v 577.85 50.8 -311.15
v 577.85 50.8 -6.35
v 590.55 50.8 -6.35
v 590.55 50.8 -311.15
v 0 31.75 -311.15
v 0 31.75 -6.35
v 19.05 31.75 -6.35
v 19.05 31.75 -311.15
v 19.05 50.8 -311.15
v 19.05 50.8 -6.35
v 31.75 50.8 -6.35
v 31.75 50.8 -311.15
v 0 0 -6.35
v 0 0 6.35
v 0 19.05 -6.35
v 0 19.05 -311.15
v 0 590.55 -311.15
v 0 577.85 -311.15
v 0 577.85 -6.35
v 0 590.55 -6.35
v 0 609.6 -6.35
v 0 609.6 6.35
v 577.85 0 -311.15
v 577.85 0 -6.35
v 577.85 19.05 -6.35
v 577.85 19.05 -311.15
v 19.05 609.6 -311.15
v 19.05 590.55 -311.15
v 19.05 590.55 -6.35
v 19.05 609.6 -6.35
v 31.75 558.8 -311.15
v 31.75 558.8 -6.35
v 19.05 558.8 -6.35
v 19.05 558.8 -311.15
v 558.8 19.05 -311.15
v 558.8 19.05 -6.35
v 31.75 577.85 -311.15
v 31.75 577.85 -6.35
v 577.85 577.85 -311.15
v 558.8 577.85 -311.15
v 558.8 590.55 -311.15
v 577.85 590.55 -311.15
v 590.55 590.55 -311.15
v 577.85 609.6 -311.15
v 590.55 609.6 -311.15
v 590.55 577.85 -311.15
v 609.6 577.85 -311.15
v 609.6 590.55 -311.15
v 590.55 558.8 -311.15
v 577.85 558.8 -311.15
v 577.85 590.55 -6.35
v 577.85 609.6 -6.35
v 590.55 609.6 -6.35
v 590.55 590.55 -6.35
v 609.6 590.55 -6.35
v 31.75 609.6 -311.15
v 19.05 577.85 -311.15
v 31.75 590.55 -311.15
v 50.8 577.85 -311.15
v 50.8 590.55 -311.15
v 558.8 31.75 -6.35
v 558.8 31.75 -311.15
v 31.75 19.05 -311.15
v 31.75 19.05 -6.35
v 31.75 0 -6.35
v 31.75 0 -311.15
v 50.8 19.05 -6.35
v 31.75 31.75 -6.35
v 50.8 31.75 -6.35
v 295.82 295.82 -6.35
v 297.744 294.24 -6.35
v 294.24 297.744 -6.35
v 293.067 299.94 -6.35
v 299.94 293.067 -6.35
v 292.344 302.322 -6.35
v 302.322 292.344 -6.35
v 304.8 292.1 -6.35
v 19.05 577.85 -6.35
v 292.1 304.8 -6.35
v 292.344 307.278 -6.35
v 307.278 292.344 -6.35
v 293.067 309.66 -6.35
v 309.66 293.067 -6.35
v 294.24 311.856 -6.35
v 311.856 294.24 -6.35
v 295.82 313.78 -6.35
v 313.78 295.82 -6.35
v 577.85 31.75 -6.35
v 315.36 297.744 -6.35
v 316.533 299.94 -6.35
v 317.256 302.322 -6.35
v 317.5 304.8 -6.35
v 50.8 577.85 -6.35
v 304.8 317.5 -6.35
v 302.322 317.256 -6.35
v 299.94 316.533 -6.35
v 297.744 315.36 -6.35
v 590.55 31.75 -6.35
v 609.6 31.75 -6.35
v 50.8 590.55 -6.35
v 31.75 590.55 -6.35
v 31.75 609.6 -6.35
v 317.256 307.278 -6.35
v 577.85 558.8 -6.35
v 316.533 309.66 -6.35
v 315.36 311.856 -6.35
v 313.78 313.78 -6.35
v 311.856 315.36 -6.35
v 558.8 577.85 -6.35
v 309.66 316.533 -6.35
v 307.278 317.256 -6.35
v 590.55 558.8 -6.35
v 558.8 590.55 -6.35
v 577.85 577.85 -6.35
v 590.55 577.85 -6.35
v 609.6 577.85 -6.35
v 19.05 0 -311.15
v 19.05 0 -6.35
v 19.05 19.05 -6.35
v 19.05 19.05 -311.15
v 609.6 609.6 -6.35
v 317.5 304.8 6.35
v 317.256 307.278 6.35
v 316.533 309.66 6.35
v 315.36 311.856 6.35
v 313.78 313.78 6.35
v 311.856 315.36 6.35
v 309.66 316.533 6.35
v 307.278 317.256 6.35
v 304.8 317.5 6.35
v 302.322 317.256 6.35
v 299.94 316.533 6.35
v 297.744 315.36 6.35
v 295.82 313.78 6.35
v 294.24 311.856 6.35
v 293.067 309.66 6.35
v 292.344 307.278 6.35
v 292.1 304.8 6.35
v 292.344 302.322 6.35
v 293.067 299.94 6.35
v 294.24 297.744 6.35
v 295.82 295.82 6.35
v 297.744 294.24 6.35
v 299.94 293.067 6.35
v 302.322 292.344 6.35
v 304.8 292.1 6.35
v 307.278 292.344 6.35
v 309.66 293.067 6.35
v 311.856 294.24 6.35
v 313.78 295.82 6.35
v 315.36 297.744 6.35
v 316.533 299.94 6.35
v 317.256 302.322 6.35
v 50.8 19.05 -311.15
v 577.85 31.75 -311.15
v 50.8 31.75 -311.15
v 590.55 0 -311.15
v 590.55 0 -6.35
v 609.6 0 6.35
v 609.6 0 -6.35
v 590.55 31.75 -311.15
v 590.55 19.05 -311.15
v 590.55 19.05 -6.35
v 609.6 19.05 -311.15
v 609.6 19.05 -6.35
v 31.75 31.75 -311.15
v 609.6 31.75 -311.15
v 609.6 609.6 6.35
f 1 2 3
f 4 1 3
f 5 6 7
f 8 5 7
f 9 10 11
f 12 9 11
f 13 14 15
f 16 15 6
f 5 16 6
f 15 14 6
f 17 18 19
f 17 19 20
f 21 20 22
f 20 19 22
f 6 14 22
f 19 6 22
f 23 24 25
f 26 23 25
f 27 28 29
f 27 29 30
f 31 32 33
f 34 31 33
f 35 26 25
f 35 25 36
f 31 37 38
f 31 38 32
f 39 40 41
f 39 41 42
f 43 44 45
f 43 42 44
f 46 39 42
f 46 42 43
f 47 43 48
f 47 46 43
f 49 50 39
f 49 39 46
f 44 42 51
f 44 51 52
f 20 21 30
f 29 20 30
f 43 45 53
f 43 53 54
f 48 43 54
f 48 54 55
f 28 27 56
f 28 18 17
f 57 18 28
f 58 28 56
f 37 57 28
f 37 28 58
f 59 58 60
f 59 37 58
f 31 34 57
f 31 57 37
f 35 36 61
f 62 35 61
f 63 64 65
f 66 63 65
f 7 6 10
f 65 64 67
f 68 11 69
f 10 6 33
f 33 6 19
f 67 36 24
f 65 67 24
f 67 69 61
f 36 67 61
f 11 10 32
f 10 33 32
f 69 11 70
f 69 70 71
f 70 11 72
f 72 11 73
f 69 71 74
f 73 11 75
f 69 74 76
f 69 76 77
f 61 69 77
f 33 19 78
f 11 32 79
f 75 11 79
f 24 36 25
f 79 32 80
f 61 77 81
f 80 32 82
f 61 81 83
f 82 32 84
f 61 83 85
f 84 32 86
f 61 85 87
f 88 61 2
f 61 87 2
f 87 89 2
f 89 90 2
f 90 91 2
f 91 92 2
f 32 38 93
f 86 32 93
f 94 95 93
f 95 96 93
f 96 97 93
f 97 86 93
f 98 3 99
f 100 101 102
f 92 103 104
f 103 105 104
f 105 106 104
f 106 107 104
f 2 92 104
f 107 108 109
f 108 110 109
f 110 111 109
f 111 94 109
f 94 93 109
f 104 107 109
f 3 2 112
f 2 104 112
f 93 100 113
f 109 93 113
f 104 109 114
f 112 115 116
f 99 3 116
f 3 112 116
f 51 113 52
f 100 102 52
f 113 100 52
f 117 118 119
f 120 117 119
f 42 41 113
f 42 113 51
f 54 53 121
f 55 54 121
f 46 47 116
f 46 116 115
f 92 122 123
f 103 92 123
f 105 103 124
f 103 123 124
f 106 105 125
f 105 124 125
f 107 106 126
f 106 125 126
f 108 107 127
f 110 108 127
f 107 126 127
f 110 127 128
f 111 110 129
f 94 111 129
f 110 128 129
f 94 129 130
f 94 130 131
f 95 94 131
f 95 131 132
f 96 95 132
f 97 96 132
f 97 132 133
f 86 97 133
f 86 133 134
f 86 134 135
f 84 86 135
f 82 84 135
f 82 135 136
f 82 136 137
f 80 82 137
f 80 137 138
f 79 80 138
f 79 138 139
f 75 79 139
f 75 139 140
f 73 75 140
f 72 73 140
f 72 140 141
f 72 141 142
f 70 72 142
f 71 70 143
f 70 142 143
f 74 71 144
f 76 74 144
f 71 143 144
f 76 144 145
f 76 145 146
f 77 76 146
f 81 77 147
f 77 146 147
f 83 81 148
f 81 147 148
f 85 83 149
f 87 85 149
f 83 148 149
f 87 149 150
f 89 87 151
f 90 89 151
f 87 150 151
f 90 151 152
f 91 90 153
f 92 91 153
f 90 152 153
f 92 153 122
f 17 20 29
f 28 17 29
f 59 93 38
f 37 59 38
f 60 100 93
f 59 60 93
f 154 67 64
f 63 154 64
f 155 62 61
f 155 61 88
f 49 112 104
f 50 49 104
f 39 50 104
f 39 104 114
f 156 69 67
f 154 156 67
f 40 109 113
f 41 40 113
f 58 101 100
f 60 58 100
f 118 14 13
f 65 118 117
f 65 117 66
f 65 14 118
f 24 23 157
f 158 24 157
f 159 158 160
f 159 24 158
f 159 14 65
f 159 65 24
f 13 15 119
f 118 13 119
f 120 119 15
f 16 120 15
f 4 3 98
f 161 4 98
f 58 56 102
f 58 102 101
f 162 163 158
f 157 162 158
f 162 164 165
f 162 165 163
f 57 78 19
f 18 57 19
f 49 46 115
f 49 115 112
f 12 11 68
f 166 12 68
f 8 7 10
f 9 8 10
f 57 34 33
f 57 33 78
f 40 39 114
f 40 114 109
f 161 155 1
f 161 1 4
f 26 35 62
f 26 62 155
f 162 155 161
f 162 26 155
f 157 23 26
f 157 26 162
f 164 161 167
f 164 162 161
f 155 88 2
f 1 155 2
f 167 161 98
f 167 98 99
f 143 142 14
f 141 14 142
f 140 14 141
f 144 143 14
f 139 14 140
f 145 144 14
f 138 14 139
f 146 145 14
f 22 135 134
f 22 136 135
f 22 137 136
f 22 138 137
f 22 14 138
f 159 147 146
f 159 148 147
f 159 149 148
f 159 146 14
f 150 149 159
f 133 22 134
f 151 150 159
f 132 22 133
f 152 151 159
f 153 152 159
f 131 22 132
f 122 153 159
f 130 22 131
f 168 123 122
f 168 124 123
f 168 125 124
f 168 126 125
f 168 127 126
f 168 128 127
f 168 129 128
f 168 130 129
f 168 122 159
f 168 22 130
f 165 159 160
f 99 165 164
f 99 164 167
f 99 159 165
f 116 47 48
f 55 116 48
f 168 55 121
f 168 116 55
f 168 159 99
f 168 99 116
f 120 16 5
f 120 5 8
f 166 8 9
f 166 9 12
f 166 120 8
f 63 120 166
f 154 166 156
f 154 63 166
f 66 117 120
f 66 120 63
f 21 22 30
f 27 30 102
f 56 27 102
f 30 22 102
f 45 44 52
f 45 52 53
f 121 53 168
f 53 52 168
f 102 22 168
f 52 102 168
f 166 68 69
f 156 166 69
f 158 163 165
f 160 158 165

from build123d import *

# Parameters (mm, degrees)
F0_W     = 609.6
F0_H     = 609.6
F1_DEPTH = 6.35
F3_DEPTH = 304.8
F4_R     = 12.7
F5_DEPTH = 317.501


with BuildPart() as f1:
    # F0 (on Top) → F1 (new body, symmetric)
    with BuildSketch(Plane.XY):
        with Locations((304.8, 304.8)):
            Rectangle(F0_W, F0_H)
    extrude(amount=F1_DEPTH, both=True)

    # F2 (on face) → F3 (join)
    with BuildSketch(Plane(origin=(0, 0, -6.35), x_dir=(1, 0, 0), z_dir=(0, 0, -1))):
        Polygon((19.05, -19.05), (0, -19.05), (0, -31.75), (19.05, -31.75), (19.05, -50.8), (31.75, -50.8), (31.75, -31.75), (50.8, -31.75), (50.8, -19.05), (31.75, -19.05), (31.75, 0), (19.05, 0), align=None)
        Polygon((590.55, -50.8), (590.55, -31.75), (609.6, -31.75), (609.6, -19.05), (590.55, -19.05), (590.55, 0), (577.85, 0), (577.85, -19.05), (558.8, -19.05), (558.8, -31.75), (577.85, -31.75), (577.85, -50.8), align=None)
        Polygon((19.05, -590.55), (19.05, -609.6), (31.75, -609.6), (31.75, -590.55), (50.8, -590.55), (50.8, -577.85), (31.75, -577.85), (31.75, -558.8), (19.05, -558.8), (19.05, -577.85), (0, -577.85), (0, -590.55), align=None)
        Polygon((577.85, -609.6), (590.55, -609.6), (590.55, -590.55), (609.6, -590.55), (609.6, -577.85), (590.55, -577.85), (590.55, -558.8), (577.85, -558.8), (577.85, -577.85), (558.8, -577.85), (558.8, -590.55), (577.85, -590.55), align=None)
    extrude(amount=F3_DEPTH)

    # F4 (on face) → F5 (cut, through all)
    with BuildSketch(Plane.XY.offset(6.35)):
        with Locations((304.8, 304.8)):
            Circle(F4_R)
    extrude(amount=-F5_DEPTH, mode=Mode.SUBTRACT)


solid = f1.part
